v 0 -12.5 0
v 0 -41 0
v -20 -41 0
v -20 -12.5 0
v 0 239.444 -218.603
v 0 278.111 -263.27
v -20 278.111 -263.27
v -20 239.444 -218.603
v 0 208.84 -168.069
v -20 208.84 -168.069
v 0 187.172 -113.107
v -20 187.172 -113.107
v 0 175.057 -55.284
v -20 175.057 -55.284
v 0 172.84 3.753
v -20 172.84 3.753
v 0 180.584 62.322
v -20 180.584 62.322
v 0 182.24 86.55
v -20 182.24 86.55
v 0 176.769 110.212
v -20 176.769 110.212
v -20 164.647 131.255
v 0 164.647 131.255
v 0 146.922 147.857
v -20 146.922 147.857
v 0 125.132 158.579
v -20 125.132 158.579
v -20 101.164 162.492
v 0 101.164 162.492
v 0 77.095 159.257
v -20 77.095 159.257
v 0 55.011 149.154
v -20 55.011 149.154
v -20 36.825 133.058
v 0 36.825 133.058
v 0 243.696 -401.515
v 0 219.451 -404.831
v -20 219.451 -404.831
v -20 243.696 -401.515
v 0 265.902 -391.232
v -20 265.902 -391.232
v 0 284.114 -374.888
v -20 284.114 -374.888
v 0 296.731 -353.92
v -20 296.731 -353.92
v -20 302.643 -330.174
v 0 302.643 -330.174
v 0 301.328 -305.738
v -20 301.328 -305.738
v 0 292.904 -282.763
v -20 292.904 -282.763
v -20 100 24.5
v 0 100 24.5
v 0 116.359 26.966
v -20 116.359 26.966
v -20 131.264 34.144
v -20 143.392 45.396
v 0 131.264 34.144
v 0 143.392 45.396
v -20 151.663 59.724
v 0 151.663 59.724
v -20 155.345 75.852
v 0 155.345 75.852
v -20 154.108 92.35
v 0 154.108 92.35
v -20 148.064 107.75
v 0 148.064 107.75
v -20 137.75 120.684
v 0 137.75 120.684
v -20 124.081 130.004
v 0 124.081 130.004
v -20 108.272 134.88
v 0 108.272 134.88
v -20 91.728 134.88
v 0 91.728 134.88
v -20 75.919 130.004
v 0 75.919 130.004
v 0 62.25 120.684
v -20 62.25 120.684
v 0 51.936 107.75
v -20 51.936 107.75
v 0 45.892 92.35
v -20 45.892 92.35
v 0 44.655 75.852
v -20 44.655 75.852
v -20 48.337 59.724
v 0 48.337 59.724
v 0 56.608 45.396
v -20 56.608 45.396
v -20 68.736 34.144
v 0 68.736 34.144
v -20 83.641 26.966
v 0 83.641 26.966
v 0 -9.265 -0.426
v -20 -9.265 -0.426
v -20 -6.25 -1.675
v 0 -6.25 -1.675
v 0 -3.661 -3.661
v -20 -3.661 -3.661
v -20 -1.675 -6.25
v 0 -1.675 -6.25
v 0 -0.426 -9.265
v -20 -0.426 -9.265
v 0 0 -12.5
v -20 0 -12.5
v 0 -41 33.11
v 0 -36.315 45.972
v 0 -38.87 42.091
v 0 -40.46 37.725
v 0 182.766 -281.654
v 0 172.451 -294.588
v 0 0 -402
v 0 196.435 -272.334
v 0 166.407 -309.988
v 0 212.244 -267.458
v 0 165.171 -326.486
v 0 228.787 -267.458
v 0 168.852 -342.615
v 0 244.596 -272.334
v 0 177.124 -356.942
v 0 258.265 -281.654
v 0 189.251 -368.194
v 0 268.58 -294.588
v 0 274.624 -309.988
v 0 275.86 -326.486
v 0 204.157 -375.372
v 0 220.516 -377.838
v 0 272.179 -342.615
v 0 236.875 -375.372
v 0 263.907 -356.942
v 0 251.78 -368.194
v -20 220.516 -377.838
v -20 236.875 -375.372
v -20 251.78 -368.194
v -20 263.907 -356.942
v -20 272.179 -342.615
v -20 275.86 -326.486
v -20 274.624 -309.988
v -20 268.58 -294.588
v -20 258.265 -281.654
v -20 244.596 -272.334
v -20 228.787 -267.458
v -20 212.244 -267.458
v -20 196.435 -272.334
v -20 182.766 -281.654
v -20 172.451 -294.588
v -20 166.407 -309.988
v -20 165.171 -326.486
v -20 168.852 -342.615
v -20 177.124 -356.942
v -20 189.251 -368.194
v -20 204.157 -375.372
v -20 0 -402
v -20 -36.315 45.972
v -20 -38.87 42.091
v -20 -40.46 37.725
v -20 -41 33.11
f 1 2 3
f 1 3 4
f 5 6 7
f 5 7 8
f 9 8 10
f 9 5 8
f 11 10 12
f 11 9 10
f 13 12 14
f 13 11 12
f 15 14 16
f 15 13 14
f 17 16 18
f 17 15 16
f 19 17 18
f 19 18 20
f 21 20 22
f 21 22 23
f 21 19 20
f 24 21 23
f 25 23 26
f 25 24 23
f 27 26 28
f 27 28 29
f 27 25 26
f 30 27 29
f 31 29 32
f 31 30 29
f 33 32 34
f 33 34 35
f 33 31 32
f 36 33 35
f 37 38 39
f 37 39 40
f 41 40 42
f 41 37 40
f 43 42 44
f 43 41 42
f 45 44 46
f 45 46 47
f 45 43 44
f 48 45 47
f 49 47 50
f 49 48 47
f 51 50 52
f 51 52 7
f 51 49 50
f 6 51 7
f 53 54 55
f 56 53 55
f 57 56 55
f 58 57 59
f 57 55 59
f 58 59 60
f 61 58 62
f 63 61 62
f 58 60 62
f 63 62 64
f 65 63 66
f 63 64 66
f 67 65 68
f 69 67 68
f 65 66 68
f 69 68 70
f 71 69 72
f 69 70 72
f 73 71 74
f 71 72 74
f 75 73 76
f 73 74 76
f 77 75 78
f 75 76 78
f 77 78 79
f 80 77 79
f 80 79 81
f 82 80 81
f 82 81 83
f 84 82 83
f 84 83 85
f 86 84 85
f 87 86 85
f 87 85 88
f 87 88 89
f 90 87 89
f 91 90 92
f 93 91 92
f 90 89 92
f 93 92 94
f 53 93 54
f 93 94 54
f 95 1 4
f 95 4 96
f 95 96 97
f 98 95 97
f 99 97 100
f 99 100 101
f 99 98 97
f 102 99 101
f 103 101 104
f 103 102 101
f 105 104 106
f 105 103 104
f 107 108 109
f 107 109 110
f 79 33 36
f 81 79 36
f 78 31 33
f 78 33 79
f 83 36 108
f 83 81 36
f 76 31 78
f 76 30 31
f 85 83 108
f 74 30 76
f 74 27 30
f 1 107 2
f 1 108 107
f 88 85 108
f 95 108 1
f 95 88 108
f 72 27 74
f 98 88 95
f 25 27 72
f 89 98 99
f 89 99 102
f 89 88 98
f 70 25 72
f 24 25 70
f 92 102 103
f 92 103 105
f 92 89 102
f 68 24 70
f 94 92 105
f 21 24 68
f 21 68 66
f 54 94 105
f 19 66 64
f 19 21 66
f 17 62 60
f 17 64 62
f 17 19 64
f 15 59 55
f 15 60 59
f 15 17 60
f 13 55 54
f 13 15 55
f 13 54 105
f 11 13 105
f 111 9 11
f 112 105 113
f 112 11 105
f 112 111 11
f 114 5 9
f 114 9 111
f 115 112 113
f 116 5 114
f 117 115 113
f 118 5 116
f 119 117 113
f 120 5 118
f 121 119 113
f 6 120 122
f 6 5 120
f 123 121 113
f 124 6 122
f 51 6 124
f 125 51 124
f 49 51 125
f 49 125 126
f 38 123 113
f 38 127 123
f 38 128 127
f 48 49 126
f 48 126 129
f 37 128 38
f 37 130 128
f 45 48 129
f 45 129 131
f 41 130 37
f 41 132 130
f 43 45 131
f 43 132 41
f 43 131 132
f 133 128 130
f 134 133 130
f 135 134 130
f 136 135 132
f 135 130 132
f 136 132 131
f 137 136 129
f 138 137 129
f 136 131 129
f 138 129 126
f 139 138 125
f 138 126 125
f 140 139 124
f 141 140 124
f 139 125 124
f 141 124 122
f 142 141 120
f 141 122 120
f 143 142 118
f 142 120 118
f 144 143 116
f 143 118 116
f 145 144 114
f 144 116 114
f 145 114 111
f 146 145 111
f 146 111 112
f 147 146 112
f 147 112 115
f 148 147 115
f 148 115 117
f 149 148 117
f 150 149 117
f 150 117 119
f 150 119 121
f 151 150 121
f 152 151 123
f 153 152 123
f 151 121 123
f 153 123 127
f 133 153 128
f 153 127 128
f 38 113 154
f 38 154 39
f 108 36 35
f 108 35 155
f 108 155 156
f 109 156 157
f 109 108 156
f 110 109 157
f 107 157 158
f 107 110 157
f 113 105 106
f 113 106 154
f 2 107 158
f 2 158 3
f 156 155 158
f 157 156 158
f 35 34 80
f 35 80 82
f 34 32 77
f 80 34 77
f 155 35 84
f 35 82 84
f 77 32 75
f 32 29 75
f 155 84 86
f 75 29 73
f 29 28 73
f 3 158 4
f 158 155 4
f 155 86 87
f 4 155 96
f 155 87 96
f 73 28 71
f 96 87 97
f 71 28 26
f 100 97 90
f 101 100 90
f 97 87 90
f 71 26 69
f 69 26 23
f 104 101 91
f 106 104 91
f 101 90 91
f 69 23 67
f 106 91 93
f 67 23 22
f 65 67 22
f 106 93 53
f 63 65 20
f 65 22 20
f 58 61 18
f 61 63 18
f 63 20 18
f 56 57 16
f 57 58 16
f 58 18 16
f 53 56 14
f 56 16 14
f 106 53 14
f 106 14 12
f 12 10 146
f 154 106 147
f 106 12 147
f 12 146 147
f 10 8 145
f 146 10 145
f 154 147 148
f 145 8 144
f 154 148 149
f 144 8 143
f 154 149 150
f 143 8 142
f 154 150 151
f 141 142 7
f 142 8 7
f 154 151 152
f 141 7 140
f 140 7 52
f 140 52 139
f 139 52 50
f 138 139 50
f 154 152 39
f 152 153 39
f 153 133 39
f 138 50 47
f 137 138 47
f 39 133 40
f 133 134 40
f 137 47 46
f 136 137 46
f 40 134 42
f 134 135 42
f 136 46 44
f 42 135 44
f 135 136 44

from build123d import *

# Parameters (mm, degrees)
SKETCH1_R          = 55.5
BASE_FLANGE1_DEPTH = 20


# Sheet-metal steps are written as plain solids
with BuildPart() as part:
    # Sketch1 → Base-Flange1 (new body)
    with BuildSketch(Plane(origin=(0, 0, 0), x_dir=(0, 0, -1), z_dir=(1, 0, 0))):
        with BuildLine():
            Line((0, -41), (0, -12.5))
            ThreePointArc((0, -12.5), (3.661165235, -3.661165235), (12.5, 0))
            Line((12.5, 0), (402, 0))
            Line((402, 0), (404.831276436, 219.451346471))
            ThreePointArc((404.831276436, 219.451346471), (353.919996754, 296.731364001), (263.269941068, 278.110759489))
            ThreePointArc((263.269941068, 278.110759489), (113.107275555, 187.171901633), (-62.321618696, 180.583651161))
            ThreePointArc((-62.321618696, 180.583651161), (-154.024103093, 136.42364838), (-133.058215758, 36.825038658))
            Line((-133.058215758, 36.825038658), (-45.972209781, -36.315142143))
            ThreePointArc((-45.972209781, -36.315142143), (-39.95421417, -39.792323471), (-33.109612021, -41))
            Line((-33.109612021, -41), (0, -41))
        make_face()
        with Locations((-80, 100)):
            Circle(SKETCH1_R, mode=Mode.SUBTRACT)
        with Locations((322.338141708, 220.515641005)):
            Circle(SKETCH1_R, mode=Mode.SUBTRACT)
    extrude(amount=-BASE_FLANGE1_DEPTH)


solid = part.part
